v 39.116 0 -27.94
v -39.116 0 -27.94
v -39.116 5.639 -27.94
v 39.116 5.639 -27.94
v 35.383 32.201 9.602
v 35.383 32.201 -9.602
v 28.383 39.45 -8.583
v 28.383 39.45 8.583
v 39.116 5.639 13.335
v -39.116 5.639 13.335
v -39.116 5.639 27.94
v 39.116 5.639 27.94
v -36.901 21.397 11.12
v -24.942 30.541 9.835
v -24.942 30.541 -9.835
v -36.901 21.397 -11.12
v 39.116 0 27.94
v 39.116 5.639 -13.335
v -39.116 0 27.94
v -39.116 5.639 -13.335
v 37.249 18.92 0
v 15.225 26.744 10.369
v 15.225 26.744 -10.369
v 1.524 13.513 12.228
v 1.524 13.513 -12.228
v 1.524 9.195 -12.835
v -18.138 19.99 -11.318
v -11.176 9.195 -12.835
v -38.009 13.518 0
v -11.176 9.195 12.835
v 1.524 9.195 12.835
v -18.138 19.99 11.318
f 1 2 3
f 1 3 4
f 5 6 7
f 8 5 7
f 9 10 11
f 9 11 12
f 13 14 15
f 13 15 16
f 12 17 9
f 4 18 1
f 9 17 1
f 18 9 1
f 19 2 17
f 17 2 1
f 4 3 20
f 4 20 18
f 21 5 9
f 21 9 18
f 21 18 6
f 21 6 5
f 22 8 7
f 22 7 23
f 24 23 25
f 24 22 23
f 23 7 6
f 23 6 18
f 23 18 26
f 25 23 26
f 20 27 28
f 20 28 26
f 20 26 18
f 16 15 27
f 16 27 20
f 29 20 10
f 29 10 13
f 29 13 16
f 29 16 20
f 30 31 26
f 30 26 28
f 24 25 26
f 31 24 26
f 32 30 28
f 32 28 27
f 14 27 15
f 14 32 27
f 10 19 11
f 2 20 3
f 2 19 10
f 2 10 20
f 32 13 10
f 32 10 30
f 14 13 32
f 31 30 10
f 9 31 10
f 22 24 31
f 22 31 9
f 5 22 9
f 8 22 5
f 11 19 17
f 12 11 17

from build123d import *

# Parameters (mm, degrees)
SKETCH1_W           = 78.232
SKETCH1_H           = 55.88
BOSS_EXTRUDE1_DEPTH = 5.6388
SKETCH2_W           = 78.232
SKETCH2_H           = 26.67
BOSS_EXTRUDE2_DEPTH = 38.1
BOSS_EXTRUDE2_TAPER = 8
CUT_EXTRUDE1_DEPTH  = 19.05


with BuildPart() as part:
    # Sketch1 → Boss-Extrude1 (new body)
    with BuildSketch(Plane(origin=(0, 0, 0), x_dir=(1, 0, 0), z_dir=(0, 1, 0))):
        Rectangle(SKETCH1_W, SKETCH1_H)
    extrude(amount=BOSS_EXTRUDE1_DEPTH)

    # Sketch2 → Boss-Extrude2 (add)
    with BuildSketch(Plane(origin=(0, 5.6388, 0), x_dir=(1, 0, 0), z_dir=(0, 1, 0))):
        Rectangle(SKETCH2_W, SKETCH2_H)
    extrude(amount=BOSS_EXTRUDE2_DEPTH, taper=BOSS_EXTRUDE2_TAPER)

    # 3DSketch1 → Cut-Extrude1 (cut, symmetric)
    with BuildSketch(Plane(origin=(39.116, 28.335306521, -1e-09), x_dir=(-0.9811621581078611, 0.1931859712741186, 2.0390368677299597e-12), z_dir=(2.078300433678865e-12, 0, 1.0))):
        Polygon((0, 0), (12.678292519, -8.831750582), (34.020347529, 21.805529518), (33.186170505, 26.042187717), (45.646929913, 28.495649552), (63.27719365, 10.210852573), (75.090838988, 23.581993737), (79.734016802, 0), (2.975738849, -15.113324905), align=None)
    extrude(amount=CUT_EXTRUDE1_DEPTH, both=True, mode=Mode.SUBTRACT)


solid = part.part
